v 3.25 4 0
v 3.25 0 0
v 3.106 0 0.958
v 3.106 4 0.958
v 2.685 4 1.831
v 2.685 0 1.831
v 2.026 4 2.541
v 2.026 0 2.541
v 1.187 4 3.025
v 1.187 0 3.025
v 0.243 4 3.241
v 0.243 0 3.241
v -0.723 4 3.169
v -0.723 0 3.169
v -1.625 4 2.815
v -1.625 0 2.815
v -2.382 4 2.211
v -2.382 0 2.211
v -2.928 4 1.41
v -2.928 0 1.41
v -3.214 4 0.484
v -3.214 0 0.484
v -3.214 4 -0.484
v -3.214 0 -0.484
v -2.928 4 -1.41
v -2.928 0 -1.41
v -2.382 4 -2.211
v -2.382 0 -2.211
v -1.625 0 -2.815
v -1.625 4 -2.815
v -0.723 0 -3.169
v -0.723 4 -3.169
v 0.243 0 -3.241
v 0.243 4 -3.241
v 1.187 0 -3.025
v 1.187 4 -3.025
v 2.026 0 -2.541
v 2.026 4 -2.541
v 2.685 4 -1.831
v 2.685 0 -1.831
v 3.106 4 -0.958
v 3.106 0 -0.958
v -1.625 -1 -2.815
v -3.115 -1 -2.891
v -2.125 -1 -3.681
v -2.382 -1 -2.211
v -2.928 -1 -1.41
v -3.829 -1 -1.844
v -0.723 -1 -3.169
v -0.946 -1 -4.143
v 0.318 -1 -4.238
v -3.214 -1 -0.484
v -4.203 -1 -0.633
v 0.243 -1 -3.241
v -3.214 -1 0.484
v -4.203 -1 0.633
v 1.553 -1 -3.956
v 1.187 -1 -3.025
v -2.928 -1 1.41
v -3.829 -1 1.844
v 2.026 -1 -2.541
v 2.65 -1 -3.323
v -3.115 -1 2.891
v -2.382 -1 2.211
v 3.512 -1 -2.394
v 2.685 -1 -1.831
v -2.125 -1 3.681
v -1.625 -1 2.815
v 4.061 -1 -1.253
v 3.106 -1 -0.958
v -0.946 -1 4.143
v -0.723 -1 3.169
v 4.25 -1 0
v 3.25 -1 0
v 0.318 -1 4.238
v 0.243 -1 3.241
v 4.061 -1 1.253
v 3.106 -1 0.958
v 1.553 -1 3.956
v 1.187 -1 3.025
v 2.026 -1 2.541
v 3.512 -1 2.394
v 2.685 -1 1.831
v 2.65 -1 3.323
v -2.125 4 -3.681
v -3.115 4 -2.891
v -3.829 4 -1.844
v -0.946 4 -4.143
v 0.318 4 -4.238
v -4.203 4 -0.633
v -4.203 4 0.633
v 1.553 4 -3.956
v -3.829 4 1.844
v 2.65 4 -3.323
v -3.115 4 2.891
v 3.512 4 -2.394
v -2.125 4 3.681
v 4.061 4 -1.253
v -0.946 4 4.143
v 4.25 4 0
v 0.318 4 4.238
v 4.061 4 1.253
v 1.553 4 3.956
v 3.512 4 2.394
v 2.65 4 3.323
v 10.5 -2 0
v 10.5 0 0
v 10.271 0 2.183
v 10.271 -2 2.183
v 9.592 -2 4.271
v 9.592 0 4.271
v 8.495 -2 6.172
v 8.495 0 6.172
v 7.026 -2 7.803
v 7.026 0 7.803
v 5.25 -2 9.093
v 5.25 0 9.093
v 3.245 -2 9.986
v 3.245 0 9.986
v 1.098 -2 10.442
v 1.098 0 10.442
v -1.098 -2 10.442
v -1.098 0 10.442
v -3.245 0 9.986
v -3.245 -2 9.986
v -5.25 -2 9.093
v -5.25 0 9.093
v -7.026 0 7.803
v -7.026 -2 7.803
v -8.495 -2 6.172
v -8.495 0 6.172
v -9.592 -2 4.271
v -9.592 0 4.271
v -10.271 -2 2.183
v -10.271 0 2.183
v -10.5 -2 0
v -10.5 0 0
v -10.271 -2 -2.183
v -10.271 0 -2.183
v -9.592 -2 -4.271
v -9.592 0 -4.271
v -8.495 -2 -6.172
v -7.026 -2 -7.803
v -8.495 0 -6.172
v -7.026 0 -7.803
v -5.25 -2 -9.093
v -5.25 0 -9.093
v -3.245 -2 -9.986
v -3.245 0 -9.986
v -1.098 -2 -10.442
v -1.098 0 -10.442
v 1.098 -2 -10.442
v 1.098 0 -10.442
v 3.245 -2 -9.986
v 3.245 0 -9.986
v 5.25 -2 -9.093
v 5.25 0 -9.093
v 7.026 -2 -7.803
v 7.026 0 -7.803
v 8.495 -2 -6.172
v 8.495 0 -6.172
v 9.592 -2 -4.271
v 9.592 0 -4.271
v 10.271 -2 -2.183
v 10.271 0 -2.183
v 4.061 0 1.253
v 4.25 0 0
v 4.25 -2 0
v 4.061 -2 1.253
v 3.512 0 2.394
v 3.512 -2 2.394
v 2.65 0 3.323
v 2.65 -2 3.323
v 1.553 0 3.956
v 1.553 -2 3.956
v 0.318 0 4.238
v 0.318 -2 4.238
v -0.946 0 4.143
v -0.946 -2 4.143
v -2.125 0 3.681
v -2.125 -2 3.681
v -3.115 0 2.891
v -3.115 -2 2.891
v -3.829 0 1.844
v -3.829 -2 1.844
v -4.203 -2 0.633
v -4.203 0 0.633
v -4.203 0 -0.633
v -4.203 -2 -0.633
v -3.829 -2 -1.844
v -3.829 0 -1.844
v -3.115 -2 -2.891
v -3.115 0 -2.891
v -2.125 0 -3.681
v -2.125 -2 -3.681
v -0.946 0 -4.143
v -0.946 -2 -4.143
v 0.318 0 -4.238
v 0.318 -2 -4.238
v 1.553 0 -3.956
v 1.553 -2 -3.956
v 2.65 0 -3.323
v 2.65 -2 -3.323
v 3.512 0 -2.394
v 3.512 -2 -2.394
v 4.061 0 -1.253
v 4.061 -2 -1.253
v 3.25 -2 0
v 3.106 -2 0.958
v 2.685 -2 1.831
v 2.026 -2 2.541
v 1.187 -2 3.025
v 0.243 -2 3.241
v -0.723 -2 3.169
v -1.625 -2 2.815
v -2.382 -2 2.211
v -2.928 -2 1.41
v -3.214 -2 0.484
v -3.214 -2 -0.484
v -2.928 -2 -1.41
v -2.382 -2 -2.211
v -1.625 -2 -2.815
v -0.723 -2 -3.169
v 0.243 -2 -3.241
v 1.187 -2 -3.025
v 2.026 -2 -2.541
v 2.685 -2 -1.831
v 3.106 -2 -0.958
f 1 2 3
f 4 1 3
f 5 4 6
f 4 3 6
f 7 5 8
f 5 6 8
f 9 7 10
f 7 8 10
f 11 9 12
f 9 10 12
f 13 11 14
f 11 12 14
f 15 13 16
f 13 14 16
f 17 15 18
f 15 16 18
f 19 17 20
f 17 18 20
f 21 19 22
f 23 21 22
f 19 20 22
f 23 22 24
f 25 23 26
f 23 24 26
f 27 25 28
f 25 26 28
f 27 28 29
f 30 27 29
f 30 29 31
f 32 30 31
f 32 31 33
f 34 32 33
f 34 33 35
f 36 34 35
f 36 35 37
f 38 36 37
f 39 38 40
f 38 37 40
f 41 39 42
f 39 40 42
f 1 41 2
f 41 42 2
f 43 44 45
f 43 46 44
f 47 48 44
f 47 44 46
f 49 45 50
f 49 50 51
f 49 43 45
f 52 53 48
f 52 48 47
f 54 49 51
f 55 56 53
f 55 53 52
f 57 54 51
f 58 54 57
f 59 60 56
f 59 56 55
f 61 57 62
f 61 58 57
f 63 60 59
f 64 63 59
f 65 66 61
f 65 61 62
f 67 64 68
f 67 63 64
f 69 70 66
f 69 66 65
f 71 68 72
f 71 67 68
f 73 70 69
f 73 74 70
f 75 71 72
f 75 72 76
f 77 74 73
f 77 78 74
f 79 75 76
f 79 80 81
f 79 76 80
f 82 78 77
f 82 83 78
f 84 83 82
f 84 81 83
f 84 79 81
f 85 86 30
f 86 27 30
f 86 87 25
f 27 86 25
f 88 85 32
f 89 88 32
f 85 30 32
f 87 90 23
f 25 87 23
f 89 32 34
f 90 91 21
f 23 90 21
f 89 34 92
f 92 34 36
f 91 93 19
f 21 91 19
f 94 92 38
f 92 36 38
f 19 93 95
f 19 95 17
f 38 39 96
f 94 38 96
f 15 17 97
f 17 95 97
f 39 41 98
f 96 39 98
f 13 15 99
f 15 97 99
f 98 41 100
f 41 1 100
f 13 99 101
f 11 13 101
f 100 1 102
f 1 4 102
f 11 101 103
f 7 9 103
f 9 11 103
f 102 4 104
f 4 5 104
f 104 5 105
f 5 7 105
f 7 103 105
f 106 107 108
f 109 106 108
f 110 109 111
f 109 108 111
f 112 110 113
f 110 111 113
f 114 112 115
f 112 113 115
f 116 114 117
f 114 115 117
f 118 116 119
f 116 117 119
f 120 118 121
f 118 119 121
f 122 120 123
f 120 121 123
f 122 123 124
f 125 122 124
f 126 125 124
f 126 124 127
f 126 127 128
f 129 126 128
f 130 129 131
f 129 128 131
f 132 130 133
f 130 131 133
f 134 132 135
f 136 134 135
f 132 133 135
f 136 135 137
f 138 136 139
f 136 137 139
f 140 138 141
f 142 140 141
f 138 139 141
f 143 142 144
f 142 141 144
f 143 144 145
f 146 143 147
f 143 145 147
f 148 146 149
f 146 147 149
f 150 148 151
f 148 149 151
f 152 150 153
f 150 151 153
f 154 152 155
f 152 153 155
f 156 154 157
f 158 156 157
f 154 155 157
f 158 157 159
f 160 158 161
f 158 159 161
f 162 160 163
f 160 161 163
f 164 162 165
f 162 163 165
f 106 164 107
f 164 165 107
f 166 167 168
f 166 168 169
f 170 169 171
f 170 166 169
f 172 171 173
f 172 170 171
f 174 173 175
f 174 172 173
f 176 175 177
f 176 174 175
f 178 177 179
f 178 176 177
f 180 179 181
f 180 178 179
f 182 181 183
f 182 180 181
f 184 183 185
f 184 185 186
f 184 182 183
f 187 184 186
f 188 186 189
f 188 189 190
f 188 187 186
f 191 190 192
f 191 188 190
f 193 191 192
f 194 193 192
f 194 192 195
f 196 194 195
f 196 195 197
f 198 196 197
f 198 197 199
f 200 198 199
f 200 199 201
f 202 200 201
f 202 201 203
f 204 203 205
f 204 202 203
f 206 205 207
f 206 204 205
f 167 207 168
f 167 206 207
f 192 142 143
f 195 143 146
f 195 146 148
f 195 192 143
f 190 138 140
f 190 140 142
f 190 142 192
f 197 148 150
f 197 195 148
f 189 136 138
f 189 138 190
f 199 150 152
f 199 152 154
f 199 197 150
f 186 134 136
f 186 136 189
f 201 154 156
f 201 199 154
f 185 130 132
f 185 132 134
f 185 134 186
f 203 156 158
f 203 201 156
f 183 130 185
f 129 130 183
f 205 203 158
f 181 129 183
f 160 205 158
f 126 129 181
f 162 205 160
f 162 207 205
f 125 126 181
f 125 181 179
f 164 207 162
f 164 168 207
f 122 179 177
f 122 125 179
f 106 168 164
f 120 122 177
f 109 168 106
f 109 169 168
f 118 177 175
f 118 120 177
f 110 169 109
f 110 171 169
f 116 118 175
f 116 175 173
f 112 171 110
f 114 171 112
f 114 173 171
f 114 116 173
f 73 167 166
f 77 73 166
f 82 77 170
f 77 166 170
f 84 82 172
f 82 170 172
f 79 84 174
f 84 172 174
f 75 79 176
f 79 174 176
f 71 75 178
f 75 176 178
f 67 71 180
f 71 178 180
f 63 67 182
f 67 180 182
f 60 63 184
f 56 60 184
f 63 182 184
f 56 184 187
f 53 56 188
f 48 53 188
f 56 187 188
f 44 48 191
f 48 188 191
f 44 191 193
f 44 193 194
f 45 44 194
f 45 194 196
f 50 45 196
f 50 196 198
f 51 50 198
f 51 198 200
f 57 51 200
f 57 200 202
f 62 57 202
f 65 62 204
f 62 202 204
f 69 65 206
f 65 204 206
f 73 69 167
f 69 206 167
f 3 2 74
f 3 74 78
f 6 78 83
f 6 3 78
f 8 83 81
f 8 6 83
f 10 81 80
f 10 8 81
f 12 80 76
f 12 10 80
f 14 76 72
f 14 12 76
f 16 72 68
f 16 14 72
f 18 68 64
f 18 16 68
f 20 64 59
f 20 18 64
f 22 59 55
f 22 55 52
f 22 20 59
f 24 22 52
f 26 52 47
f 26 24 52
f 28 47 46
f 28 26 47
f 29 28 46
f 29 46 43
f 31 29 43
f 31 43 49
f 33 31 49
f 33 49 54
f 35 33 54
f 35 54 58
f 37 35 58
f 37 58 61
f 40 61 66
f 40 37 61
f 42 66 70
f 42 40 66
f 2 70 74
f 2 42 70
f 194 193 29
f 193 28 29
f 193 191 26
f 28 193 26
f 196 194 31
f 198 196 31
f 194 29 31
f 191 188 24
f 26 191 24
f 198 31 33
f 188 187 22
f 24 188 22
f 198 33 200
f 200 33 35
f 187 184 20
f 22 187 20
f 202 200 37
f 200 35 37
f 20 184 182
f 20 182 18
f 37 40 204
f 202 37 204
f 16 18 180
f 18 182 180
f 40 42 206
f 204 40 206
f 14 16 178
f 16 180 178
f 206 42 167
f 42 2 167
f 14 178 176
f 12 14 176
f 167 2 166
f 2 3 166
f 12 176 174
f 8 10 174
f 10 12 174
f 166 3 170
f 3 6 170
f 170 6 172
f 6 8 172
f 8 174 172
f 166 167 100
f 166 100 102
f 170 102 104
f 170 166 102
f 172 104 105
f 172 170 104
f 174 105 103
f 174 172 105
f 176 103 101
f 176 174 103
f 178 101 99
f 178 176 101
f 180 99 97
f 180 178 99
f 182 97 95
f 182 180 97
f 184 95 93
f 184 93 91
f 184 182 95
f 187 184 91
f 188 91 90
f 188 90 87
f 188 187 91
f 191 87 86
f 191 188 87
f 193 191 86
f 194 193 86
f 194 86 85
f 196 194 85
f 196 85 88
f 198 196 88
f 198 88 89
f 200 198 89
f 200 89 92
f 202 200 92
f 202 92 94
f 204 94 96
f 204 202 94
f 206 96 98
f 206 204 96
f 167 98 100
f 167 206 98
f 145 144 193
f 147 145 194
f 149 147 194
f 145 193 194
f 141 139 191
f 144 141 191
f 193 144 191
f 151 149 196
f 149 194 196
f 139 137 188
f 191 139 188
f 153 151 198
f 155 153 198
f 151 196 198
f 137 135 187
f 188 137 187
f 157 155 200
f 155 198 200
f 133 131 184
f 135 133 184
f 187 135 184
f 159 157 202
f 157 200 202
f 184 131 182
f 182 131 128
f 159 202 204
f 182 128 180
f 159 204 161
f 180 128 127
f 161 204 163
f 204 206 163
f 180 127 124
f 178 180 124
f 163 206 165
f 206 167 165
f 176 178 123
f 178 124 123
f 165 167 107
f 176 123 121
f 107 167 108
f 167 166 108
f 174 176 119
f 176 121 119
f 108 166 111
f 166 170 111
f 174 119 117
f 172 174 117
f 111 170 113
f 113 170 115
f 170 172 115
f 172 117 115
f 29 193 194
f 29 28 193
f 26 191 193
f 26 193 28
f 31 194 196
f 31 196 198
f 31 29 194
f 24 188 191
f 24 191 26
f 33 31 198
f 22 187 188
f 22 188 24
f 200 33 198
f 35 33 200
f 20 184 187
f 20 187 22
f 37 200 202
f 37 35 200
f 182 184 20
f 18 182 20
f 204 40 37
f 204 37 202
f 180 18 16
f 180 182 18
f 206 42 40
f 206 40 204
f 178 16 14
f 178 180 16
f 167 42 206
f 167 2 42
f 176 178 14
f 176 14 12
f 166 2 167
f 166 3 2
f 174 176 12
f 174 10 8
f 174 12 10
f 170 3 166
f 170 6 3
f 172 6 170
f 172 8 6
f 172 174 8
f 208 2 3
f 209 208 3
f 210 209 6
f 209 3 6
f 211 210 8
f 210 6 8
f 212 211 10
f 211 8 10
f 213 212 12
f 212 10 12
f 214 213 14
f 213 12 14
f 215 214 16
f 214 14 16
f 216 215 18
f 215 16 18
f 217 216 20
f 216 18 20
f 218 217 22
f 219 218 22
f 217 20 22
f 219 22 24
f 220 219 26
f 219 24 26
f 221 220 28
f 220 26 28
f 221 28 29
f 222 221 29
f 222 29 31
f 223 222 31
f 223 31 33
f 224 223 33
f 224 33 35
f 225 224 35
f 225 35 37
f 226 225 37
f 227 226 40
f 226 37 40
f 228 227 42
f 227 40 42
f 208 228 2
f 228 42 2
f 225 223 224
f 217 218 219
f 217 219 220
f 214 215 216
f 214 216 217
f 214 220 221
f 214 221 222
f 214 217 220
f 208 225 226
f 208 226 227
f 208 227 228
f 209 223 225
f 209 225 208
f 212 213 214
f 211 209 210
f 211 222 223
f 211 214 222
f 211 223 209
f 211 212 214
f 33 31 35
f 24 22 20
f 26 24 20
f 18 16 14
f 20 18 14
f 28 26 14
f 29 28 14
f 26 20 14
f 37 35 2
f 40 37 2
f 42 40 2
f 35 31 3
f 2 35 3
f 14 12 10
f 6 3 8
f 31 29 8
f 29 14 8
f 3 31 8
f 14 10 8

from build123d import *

# Parameters (mm, degrees)
F0_R     = 10.5
F0_R_2   = 4.25
F0_R_3   = 3.25
F1_DEPTH = 2
F2_DEPTH = 4
F3_DEPTH = 1


with BuildPart() as f1:
    # F0 (on Front) → F1 (new body)
    with BuildSketch(Plane.XZ):
        Circle(F0_R)
        Circle(F0_R_2, mode=Mode.SUBTRACT)
        Circle(F0_R_3)
    extrude(amount=F1_DEPTH)


with BuildPart() as f2:
    # F0 (on Front) → F2 (new body)
    with BuildSketch(Plane.XZ):
        Circle(F0_R_2)
        Circle(F0_R_3, mode=Mode.SUBTRACT)
    extrude(amount=-F2_DEPTH)


with BuildPart() as f3:
    # F0 (on Front) → F3 (new body)
    with BuildSketch(Plane.XZ):
        Circle(F0_R_2)
        Circle(F0_R_3, mode=Mode.SUBTRACT)
    extrude(amount=F3_DEPTH)


solid = Compound([f1.part, f2.part, f3.part])
